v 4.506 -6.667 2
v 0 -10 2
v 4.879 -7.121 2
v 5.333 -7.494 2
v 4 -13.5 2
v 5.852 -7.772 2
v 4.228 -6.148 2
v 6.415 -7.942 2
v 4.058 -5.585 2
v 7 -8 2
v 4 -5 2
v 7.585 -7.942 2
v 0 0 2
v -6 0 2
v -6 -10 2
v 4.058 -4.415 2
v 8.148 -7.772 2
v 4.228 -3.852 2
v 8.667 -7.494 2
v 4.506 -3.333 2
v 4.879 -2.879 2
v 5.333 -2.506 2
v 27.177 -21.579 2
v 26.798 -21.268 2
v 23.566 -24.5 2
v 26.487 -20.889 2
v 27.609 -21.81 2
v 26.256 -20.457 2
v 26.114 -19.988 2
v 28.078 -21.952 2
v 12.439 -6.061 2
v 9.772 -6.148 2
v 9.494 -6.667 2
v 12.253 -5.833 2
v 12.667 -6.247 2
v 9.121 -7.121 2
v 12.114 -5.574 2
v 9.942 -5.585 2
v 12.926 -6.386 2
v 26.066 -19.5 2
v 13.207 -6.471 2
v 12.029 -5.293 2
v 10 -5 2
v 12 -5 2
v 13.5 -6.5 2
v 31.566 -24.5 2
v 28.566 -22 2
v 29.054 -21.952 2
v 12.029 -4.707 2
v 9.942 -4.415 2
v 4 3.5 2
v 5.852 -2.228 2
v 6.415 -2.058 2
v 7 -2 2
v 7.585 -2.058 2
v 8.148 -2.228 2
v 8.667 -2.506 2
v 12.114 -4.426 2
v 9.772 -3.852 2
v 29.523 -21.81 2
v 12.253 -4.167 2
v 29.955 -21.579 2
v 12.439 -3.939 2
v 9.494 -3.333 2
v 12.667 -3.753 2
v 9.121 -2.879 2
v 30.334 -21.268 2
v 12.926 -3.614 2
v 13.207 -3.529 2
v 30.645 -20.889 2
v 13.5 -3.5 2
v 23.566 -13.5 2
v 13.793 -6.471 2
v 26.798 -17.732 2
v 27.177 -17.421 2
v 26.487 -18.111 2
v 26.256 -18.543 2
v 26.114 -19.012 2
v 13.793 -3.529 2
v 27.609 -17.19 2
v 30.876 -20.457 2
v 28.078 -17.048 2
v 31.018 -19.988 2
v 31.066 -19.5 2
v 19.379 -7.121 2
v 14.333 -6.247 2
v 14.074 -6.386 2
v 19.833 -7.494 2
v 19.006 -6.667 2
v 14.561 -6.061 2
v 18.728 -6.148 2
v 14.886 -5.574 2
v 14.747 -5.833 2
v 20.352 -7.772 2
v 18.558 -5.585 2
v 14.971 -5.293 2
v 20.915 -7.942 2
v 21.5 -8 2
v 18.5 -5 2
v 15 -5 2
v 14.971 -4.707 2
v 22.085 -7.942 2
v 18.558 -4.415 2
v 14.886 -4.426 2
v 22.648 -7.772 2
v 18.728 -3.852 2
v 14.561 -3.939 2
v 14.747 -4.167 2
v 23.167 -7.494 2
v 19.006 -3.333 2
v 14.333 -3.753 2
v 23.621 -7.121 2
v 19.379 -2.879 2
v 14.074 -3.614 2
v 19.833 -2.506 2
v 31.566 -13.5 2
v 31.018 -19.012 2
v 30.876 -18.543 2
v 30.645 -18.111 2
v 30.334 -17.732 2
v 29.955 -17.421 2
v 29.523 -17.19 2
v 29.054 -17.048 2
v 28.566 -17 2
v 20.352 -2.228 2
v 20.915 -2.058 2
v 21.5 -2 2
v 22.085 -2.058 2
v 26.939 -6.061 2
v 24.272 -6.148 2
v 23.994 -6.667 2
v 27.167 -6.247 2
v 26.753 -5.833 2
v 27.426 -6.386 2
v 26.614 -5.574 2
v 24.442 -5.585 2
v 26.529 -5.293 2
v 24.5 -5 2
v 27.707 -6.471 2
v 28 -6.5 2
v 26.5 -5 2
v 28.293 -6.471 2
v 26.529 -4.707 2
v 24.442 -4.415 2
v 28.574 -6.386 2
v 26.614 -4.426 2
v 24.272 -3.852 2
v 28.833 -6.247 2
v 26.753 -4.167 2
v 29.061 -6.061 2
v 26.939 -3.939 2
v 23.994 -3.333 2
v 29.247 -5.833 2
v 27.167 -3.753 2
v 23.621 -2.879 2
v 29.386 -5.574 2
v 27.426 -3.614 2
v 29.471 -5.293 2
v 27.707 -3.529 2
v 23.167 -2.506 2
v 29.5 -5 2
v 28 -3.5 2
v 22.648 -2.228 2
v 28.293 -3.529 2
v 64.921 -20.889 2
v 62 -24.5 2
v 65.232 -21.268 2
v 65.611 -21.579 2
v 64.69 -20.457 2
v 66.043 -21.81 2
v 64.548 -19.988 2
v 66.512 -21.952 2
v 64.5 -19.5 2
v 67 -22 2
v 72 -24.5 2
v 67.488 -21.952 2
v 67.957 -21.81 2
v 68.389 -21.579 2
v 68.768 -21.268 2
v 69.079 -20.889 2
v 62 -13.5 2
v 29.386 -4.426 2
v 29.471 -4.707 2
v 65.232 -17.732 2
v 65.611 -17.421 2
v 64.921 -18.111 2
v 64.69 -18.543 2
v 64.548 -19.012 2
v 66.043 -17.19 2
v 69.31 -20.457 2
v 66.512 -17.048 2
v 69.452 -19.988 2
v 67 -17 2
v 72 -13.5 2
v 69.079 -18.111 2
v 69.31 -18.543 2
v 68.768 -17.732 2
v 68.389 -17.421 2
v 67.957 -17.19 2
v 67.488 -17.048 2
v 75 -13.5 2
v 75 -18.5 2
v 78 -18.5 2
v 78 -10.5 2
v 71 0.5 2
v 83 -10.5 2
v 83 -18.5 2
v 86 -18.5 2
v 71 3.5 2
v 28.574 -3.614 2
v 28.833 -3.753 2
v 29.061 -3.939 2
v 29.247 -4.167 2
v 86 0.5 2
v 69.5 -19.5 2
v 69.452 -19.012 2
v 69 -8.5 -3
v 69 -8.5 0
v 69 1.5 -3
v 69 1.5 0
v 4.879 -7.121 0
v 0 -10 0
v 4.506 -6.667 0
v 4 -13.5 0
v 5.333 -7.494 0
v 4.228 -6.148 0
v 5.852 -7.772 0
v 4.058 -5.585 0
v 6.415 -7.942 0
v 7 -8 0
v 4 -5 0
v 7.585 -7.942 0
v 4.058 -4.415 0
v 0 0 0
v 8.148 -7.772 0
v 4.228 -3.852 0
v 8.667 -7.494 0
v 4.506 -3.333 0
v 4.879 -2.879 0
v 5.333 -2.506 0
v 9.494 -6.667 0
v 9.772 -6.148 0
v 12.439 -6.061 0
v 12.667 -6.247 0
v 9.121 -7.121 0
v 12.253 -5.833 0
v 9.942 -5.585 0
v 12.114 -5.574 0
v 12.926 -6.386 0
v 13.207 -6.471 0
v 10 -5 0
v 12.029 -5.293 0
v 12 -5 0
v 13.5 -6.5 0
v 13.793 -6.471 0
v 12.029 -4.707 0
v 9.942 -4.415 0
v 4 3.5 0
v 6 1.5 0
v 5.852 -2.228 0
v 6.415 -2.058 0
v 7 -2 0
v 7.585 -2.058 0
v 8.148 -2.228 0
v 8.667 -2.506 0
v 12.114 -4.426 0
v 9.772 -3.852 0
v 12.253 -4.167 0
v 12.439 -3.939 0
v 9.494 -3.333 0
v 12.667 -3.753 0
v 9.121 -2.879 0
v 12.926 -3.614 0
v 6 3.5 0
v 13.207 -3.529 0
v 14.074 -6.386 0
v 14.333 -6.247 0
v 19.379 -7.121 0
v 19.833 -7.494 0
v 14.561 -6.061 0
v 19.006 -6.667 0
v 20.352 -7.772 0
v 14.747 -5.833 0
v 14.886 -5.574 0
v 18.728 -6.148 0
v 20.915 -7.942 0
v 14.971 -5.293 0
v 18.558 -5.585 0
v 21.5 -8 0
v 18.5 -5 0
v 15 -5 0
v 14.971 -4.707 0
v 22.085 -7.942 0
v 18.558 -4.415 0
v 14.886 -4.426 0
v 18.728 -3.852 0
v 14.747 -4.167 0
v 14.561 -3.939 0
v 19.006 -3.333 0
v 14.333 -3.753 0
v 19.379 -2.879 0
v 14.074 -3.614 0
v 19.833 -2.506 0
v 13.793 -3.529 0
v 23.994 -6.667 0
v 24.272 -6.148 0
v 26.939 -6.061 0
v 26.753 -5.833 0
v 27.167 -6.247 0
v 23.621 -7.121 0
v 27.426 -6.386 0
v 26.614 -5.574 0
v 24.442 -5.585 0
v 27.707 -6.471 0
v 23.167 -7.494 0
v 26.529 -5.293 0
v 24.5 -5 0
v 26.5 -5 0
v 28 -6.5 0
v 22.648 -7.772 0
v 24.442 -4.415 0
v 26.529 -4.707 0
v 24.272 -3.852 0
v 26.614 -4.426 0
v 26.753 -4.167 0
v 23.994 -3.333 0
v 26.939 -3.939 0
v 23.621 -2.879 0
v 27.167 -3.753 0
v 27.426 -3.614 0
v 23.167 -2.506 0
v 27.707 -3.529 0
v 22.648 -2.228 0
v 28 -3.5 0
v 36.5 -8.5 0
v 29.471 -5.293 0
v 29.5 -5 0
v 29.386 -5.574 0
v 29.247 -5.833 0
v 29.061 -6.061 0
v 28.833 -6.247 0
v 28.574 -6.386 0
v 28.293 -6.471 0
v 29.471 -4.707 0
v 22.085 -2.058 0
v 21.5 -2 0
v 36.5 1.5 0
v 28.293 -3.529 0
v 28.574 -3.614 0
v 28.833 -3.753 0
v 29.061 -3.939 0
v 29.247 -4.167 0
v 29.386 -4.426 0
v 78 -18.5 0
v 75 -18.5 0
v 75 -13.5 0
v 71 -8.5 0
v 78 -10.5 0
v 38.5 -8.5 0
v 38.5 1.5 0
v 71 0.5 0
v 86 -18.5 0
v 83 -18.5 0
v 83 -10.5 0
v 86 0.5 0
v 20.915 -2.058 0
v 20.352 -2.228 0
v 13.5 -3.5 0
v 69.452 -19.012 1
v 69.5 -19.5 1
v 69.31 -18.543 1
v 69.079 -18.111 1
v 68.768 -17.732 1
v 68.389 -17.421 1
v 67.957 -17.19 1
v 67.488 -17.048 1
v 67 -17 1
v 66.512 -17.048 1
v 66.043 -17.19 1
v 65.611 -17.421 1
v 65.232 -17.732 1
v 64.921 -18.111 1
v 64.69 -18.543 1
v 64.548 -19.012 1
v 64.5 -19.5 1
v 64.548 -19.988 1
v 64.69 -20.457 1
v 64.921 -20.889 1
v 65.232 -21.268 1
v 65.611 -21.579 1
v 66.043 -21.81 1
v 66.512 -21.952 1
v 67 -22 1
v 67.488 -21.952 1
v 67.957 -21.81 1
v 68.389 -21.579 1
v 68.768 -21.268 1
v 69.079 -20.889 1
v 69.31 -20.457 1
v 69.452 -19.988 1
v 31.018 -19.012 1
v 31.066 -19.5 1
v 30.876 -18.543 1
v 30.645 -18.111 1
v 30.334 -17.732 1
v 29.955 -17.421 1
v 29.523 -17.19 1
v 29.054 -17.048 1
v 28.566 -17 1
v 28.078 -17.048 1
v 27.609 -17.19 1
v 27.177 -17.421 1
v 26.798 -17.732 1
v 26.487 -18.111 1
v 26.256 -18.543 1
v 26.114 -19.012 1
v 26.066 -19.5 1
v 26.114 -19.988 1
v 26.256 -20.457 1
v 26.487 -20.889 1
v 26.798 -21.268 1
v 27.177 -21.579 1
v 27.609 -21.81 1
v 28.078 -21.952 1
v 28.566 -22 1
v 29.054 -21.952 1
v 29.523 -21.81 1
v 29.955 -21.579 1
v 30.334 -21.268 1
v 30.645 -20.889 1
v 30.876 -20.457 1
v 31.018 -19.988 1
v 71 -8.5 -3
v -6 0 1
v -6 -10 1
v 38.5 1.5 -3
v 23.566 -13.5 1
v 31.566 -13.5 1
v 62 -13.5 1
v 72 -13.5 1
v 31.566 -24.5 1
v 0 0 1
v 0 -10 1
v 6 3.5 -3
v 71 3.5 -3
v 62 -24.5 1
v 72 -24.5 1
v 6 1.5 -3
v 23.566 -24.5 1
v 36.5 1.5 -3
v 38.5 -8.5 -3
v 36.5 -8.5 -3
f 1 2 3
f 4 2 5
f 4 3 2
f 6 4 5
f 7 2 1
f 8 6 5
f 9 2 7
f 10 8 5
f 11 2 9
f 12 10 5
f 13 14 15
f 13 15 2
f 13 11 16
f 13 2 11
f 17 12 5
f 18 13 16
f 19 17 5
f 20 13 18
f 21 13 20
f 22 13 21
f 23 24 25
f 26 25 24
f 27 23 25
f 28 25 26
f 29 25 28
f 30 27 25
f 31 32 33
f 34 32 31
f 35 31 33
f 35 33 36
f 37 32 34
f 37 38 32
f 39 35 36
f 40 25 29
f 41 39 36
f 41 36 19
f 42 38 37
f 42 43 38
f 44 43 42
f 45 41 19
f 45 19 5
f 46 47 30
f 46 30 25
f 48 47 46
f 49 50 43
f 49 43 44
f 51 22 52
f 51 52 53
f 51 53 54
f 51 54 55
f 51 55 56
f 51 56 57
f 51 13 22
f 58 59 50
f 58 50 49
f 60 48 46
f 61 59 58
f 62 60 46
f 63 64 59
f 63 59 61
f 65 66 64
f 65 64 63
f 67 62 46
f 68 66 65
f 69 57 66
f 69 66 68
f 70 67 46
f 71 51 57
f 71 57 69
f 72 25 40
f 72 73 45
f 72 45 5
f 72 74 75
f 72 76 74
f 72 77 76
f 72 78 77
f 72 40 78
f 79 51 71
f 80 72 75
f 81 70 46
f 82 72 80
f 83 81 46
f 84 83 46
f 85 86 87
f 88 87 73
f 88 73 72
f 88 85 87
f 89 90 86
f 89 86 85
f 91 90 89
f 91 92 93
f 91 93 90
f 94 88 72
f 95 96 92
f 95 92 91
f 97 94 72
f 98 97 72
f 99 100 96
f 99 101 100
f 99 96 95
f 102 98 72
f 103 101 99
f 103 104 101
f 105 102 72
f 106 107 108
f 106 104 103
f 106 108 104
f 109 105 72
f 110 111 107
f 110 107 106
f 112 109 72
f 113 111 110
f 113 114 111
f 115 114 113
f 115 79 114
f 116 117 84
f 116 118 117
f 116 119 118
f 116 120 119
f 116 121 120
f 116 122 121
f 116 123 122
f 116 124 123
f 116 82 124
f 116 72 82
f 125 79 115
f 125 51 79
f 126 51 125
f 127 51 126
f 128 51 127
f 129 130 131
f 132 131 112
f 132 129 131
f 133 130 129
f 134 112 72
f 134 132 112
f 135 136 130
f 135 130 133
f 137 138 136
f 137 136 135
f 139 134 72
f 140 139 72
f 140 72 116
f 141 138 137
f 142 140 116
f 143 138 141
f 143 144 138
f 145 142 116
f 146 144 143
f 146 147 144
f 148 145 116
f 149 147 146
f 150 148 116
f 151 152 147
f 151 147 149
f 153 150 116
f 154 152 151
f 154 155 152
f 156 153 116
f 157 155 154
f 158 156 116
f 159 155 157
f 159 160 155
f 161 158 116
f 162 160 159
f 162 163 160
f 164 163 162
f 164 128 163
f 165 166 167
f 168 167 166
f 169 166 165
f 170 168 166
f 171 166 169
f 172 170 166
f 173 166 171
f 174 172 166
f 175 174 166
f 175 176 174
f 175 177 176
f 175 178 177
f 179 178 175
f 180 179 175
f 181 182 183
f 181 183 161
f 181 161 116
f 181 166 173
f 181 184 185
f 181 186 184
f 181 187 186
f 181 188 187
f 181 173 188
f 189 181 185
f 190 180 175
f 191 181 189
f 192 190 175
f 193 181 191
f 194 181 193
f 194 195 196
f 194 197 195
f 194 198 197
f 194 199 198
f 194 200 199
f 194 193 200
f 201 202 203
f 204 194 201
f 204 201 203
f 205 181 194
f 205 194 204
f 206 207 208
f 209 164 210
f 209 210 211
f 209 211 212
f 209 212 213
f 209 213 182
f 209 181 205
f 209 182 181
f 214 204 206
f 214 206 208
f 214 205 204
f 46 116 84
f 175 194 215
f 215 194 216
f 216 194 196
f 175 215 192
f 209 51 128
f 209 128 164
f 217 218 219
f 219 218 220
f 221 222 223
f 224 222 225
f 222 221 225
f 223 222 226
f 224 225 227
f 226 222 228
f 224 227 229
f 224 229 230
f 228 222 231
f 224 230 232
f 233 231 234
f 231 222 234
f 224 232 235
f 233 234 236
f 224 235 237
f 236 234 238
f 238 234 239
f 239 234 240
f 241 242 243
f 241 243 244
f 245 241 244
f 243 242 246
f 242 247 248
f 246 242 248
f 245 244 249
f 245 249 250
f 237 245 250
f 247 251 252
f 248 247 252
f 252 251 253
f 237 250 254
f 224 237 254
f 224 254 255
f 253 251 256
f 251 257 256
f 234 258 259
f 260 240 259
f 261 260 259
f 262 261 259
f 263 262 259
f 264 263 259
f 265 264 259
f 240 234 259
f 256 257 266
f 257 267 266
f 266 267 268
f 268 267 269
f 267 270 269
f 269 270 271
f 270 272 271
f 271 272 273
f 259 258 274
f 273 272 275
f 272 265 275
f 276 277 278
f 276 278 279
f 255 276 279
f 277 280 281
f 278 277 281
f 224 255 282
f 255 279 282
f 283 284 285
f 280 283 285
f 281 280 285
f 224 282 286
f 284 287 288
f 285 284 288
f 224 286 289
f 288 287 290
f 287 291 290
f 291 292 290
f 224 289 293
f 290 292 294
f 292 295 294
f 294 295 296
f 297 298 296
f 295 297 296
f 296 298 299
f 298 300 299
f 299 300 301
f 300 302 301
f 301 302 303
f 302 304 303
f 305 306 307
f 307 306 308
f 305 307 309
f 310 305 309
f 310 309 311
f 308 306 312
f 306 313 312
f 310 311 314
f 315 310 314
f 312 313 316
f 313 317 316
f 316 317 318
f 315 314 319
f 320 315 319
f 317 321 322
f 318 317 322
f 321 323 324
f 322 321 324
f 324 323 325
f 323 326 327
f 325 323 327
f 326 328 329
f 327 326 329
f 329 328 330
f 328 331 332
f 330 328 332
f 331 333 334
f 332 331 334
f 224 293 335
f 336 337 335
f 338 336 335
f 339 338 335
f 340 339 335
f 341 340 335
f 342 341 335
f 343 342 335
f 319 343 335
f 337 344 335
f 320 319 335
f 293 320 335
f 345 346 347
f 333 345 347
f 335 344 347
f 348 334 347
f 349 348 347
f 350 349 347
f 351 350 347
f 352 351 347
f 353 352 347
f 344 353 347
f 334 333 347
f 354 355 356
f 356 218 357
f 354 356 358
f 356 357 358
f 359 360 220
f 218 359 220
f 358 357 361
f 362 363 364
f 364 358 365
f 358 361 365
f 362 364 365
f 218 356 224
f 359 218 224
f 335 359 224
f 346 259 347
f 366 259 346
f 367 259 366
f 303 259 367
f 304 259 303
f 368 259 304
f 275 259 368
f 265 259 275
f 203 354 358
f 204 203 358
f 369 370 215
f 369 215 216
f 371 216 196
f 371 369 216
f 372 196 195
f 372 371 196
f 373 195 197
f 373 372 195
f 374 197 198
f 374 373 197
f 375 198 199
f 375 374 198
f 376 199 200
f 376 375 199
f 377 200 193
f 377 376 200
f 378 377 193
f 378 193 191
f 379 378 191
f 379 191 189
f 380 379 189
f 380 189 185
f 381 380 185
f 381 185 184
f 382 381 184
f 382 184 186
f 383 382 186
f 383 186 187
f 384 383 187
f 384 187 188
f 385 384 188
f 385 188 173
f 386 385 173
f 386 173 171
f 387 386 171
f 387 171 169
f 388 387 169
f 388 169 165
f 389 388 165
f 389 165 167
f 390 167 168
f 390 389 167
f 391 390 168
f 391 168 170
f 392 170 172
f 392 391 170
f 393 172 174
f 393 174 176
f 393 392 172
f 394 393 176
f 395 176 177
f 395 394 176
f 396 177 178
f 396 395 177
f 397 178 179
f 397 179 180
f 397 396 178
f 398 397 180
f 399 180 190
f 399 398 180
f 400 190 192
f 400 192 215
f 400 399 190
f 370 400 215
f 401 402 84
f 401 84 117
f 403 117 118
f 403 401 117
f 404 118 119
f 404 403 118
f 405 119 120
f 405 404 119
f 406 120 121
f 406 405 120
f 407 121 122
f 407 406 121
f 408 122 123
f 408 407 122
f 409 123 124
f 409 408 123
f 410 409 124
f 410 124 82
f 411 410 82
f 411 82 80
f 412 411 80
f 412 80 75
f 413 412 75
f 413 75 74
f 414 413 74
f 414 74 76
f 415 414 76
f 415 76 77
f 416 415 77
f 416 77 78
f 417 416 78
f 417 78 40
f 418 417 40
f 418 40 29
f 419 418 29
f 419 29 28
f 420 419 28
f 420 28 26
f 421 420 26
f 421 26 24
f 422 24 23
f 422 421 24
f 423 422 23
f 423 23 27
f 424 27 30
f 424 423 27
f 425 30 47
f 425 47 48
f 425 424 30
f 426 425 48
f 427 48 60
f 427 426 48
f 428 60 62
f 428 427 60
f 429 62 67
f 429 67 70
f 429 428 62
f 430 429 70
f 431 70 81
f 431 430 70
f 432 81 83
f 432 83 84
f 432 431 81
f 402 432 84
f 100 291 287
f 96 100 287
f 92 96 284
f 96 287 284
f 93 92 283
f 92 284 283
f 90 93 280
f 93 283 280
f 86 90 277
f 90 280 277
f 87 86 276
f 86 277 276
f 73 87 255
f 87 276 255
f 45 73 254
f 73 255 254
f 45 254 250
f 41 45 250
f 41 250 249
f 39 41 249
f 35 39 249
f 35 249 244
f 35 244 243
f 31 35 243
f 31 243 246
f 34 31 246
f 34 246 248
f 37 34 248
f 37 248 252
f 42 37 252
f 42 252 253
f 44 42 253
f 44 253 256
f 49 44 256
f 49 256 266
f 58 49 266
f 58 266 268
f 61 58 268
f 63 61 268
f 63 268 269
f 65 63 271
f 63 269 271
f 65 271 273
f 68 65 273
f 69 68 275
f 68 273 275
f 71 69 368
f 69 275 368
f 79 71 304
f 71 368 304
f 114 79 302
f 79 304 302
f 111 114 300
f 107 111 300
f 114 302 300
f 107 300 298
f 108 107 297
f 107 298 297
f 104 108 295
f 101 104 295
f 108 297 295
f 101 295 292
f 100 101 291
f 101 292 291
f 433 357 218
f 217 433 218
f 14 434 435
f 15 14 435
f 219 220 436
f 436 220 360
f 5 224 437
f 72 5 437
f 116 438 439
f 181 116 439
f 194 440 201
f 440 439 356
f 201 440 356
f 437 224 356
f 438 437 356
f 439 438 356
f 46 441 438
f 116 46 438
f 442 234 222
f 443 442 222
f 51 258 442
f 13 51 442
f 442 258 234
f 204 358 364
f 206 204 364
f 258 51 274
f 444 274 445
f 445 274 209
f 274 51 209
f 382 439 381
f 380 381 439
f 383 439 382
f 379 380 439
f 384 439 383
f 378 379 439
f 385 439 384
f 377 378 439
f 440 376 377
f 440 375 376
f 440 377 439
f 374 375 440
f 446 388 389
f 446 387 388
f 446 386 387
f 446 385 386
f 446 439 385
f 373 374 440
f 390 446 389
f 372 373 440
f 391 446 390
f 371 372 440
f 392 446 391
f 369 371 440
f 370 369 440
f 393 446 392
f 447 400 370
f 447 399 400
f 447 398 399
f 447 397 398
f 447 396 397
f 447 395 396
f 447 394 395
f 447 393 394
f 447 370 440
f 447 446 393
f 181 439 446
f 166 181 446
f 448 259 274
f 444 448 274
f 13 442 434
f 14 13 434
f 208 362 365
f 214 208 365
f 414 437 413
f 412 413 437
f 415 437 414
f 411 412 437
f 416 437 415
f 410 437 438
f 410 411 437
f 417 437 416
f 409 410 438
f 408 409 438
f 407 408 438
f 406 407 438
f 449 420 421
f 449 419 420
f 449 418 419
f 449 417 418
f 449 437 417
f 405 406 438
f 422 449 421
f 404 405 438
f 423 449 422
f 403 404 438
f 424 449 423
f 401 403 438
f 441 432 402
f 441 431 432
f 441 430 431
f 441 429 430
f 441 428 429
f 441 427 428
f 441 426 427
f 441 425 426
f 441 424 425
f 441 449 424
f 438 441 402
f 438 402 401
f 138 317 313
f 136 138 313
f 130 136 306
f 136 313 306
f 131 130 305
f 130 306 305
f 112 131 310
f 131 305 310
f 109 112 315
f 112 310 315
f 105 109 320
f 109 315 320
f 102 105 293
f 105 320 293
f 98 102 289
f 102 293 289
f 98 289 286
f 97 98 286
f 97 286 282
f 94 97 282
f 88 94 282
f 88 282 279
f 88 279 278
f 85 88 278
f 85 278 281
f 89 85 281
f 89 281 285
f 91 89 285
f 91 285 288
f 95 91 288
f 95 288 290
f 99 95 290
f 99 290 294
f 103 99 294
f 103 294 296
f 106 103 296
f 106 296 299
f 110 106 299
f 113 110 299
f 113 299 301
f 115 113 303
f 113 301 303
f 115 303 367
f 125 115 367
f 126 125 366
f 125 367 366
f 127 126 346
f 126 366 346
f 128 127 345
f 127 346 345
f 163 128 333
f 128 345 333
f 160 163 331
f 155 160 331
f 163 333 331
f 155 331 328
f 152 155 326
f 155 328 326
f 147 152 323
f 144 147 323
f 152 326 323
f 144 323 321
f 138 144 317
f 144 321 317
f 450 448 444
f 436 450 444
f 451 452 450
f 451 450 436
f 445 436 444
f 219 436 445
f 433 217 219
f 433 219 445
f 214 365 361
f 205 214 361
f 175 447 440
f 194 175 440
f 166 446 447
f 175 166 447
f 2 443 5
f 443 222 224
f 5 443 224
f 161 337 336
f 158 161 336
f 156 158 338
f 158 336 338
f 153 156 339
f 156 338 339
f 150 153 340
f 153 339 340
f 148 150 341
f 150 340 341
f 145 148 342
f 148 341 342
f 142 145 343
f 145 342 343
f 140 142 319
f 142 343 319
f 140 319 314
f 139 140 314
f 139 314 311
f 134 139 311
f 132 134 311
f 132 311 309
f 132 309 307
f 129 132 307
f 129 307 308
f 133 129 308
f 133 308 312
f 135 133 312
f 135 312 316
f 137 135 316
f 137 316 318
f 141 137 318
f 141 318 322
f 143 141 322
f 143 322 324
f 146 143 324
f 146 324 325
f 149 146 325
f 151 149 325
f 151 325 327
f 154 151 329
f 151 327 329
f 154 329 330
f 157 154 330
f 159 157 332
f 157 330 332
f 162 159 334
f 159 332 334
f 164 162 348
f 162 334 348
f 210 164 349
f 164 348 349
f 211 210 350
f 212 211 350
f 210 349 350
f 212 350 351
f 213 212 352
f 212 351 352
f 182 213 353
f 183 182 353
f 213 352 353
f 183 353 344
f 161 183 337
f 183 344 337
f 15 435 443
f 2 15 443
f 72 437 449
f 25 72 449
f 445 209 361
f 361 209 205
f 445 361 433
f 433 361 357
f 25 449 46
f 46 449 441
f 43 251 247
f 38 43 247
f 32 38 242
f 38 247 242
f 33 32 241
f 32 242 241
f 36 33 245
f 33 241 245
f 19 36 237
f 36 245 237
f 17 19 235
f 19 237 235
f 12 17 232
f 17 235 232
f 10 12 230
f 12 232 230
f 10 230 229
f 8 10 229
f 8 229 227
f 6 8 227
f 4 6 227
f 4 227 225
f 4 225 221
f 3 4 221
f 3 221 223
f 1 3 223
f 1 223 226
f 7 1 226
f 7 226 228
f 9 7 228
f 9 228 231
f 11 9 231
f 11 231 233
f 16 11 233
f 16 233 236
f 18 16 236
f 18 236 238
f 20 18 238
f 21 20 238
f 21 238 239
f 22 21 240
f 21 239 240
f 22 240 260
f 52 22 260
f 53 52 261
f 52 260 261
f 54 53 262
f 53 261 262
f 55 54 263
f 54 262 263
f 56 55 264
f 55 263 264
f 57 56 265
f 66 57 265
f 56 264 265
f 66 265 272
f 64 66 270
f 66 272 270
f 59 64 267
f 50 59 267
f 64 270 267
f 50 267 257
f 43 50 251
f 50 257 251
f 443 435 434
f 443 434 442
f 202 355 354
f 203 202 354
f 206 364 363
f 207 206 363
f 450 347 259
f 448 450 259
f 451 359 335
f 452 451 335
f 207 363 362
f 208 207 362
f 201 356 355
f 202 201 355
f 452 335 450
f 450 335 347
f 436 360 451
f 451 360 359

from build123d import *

# Parameters (mm, degrees)
SKETCH_R        = 2.5
PAD_DEPTH       = 2
PAD001_DEPTH    = 3
SKETCH004_W     = 6
SKETCH004_H     = 10
SKETCH004_W_2   = 8
SKETCH004_H_2   = 11
SKETCH004_W_3   = 10
POCKET_DEPTH    = 1
SKETCH005_R     = 3
SKETCH005_R_2   = 1.5
POCKET001_DEPTH = 5


with BuildPart() as part:
    # Sketch → Pad (new body)
    with BuildSketch(Plane.XY):
        Polygon((0, 0), (-6, 0), (-6, -10), (0, -10), (4, -13.5), (23.566, -13.5), (23.566, -24.5), (31.566, -24.5), (31.566, -13.5), (62, -13.5), (62, -24.5), (72, -24.5), (72, -13.5), (75, -13.5), (75, -18.5), (78, -18.5), (78, -10.5), (83, -10.5), (83, -18.5), (86, -18.5), (86, 0.5), (71, 0.5), (71, 3.5), (4, 3.5), align=None)
        with Locations((28.566, -19.5)):
            Circle(SKETCH_R, mode=Mode.SUBTRACT)
        with Locations((67, -19.5)):
            Circle(SKETCH_R, mode=Mode.SUBTRACT)
    extrude(amount=PAD_DEPTH)

    # Sketch003 (on Face27 of Pad) → Pad001 (join)
    with BuildSketch(Plane(origin=(0, 0, 0), x_dir=(1, 0, 0), z_dir=(0, 0, -1))):
        Polygon((6, -3.5), (71, -3.5), (71, 8.5), (69, 8.5), (69, -1.5), (38.5, -1.5), (38.5, 8.5), (36.5, 8.5), (36.5, -1.5), (6, -1.5), align=None)
    extrude(amount=PAD001_DEPTH)

    # Sketch004 (on Face4 of Pad001) → Pocket (cut)
    with BuildSketch(Plane(origin=(0, 0, 0), x_dir=(1, 0, 0), z_dir=(0, 0, -1))):
        with Locations((-3, 5)):
            Rectangle(SKETCH004_W, SKETCH004_H)
        with Locations((27.566, 19)):
            Rectangle(SKETCH004_W_2, SKETCH004_H_2)
        with Locations((67, 19)):
            Rectangle(SKETCH004_W_3, SKETCH004_H_2)
    extrude(amount=-POCKET_DEPTH, mode=Mode.SUBTRACT)

    # Sketch005 (on Face4 of Pocket) → Pocket001 (cut)
    with BuildSketch(Plane(origin=(0, 0, 0), x_dir=(1, 0, 0), z_dir=(0, 0, -1))):
        with Locations((7, 5)):
            Circle(SKETCH005_R)
        with Locations((13.5, 5)):
            Circle(SKETCH005_R_2)
        with Locations((21.5, 5)):
            Circle(SKETCH005_R)
        with Locations((28, 5)):
            Circle(SKETCH005_R_2)
    extrude(amount=-POCKET001_DEPTH, mode=Mode.SUBTRACT)


solid = part.part
